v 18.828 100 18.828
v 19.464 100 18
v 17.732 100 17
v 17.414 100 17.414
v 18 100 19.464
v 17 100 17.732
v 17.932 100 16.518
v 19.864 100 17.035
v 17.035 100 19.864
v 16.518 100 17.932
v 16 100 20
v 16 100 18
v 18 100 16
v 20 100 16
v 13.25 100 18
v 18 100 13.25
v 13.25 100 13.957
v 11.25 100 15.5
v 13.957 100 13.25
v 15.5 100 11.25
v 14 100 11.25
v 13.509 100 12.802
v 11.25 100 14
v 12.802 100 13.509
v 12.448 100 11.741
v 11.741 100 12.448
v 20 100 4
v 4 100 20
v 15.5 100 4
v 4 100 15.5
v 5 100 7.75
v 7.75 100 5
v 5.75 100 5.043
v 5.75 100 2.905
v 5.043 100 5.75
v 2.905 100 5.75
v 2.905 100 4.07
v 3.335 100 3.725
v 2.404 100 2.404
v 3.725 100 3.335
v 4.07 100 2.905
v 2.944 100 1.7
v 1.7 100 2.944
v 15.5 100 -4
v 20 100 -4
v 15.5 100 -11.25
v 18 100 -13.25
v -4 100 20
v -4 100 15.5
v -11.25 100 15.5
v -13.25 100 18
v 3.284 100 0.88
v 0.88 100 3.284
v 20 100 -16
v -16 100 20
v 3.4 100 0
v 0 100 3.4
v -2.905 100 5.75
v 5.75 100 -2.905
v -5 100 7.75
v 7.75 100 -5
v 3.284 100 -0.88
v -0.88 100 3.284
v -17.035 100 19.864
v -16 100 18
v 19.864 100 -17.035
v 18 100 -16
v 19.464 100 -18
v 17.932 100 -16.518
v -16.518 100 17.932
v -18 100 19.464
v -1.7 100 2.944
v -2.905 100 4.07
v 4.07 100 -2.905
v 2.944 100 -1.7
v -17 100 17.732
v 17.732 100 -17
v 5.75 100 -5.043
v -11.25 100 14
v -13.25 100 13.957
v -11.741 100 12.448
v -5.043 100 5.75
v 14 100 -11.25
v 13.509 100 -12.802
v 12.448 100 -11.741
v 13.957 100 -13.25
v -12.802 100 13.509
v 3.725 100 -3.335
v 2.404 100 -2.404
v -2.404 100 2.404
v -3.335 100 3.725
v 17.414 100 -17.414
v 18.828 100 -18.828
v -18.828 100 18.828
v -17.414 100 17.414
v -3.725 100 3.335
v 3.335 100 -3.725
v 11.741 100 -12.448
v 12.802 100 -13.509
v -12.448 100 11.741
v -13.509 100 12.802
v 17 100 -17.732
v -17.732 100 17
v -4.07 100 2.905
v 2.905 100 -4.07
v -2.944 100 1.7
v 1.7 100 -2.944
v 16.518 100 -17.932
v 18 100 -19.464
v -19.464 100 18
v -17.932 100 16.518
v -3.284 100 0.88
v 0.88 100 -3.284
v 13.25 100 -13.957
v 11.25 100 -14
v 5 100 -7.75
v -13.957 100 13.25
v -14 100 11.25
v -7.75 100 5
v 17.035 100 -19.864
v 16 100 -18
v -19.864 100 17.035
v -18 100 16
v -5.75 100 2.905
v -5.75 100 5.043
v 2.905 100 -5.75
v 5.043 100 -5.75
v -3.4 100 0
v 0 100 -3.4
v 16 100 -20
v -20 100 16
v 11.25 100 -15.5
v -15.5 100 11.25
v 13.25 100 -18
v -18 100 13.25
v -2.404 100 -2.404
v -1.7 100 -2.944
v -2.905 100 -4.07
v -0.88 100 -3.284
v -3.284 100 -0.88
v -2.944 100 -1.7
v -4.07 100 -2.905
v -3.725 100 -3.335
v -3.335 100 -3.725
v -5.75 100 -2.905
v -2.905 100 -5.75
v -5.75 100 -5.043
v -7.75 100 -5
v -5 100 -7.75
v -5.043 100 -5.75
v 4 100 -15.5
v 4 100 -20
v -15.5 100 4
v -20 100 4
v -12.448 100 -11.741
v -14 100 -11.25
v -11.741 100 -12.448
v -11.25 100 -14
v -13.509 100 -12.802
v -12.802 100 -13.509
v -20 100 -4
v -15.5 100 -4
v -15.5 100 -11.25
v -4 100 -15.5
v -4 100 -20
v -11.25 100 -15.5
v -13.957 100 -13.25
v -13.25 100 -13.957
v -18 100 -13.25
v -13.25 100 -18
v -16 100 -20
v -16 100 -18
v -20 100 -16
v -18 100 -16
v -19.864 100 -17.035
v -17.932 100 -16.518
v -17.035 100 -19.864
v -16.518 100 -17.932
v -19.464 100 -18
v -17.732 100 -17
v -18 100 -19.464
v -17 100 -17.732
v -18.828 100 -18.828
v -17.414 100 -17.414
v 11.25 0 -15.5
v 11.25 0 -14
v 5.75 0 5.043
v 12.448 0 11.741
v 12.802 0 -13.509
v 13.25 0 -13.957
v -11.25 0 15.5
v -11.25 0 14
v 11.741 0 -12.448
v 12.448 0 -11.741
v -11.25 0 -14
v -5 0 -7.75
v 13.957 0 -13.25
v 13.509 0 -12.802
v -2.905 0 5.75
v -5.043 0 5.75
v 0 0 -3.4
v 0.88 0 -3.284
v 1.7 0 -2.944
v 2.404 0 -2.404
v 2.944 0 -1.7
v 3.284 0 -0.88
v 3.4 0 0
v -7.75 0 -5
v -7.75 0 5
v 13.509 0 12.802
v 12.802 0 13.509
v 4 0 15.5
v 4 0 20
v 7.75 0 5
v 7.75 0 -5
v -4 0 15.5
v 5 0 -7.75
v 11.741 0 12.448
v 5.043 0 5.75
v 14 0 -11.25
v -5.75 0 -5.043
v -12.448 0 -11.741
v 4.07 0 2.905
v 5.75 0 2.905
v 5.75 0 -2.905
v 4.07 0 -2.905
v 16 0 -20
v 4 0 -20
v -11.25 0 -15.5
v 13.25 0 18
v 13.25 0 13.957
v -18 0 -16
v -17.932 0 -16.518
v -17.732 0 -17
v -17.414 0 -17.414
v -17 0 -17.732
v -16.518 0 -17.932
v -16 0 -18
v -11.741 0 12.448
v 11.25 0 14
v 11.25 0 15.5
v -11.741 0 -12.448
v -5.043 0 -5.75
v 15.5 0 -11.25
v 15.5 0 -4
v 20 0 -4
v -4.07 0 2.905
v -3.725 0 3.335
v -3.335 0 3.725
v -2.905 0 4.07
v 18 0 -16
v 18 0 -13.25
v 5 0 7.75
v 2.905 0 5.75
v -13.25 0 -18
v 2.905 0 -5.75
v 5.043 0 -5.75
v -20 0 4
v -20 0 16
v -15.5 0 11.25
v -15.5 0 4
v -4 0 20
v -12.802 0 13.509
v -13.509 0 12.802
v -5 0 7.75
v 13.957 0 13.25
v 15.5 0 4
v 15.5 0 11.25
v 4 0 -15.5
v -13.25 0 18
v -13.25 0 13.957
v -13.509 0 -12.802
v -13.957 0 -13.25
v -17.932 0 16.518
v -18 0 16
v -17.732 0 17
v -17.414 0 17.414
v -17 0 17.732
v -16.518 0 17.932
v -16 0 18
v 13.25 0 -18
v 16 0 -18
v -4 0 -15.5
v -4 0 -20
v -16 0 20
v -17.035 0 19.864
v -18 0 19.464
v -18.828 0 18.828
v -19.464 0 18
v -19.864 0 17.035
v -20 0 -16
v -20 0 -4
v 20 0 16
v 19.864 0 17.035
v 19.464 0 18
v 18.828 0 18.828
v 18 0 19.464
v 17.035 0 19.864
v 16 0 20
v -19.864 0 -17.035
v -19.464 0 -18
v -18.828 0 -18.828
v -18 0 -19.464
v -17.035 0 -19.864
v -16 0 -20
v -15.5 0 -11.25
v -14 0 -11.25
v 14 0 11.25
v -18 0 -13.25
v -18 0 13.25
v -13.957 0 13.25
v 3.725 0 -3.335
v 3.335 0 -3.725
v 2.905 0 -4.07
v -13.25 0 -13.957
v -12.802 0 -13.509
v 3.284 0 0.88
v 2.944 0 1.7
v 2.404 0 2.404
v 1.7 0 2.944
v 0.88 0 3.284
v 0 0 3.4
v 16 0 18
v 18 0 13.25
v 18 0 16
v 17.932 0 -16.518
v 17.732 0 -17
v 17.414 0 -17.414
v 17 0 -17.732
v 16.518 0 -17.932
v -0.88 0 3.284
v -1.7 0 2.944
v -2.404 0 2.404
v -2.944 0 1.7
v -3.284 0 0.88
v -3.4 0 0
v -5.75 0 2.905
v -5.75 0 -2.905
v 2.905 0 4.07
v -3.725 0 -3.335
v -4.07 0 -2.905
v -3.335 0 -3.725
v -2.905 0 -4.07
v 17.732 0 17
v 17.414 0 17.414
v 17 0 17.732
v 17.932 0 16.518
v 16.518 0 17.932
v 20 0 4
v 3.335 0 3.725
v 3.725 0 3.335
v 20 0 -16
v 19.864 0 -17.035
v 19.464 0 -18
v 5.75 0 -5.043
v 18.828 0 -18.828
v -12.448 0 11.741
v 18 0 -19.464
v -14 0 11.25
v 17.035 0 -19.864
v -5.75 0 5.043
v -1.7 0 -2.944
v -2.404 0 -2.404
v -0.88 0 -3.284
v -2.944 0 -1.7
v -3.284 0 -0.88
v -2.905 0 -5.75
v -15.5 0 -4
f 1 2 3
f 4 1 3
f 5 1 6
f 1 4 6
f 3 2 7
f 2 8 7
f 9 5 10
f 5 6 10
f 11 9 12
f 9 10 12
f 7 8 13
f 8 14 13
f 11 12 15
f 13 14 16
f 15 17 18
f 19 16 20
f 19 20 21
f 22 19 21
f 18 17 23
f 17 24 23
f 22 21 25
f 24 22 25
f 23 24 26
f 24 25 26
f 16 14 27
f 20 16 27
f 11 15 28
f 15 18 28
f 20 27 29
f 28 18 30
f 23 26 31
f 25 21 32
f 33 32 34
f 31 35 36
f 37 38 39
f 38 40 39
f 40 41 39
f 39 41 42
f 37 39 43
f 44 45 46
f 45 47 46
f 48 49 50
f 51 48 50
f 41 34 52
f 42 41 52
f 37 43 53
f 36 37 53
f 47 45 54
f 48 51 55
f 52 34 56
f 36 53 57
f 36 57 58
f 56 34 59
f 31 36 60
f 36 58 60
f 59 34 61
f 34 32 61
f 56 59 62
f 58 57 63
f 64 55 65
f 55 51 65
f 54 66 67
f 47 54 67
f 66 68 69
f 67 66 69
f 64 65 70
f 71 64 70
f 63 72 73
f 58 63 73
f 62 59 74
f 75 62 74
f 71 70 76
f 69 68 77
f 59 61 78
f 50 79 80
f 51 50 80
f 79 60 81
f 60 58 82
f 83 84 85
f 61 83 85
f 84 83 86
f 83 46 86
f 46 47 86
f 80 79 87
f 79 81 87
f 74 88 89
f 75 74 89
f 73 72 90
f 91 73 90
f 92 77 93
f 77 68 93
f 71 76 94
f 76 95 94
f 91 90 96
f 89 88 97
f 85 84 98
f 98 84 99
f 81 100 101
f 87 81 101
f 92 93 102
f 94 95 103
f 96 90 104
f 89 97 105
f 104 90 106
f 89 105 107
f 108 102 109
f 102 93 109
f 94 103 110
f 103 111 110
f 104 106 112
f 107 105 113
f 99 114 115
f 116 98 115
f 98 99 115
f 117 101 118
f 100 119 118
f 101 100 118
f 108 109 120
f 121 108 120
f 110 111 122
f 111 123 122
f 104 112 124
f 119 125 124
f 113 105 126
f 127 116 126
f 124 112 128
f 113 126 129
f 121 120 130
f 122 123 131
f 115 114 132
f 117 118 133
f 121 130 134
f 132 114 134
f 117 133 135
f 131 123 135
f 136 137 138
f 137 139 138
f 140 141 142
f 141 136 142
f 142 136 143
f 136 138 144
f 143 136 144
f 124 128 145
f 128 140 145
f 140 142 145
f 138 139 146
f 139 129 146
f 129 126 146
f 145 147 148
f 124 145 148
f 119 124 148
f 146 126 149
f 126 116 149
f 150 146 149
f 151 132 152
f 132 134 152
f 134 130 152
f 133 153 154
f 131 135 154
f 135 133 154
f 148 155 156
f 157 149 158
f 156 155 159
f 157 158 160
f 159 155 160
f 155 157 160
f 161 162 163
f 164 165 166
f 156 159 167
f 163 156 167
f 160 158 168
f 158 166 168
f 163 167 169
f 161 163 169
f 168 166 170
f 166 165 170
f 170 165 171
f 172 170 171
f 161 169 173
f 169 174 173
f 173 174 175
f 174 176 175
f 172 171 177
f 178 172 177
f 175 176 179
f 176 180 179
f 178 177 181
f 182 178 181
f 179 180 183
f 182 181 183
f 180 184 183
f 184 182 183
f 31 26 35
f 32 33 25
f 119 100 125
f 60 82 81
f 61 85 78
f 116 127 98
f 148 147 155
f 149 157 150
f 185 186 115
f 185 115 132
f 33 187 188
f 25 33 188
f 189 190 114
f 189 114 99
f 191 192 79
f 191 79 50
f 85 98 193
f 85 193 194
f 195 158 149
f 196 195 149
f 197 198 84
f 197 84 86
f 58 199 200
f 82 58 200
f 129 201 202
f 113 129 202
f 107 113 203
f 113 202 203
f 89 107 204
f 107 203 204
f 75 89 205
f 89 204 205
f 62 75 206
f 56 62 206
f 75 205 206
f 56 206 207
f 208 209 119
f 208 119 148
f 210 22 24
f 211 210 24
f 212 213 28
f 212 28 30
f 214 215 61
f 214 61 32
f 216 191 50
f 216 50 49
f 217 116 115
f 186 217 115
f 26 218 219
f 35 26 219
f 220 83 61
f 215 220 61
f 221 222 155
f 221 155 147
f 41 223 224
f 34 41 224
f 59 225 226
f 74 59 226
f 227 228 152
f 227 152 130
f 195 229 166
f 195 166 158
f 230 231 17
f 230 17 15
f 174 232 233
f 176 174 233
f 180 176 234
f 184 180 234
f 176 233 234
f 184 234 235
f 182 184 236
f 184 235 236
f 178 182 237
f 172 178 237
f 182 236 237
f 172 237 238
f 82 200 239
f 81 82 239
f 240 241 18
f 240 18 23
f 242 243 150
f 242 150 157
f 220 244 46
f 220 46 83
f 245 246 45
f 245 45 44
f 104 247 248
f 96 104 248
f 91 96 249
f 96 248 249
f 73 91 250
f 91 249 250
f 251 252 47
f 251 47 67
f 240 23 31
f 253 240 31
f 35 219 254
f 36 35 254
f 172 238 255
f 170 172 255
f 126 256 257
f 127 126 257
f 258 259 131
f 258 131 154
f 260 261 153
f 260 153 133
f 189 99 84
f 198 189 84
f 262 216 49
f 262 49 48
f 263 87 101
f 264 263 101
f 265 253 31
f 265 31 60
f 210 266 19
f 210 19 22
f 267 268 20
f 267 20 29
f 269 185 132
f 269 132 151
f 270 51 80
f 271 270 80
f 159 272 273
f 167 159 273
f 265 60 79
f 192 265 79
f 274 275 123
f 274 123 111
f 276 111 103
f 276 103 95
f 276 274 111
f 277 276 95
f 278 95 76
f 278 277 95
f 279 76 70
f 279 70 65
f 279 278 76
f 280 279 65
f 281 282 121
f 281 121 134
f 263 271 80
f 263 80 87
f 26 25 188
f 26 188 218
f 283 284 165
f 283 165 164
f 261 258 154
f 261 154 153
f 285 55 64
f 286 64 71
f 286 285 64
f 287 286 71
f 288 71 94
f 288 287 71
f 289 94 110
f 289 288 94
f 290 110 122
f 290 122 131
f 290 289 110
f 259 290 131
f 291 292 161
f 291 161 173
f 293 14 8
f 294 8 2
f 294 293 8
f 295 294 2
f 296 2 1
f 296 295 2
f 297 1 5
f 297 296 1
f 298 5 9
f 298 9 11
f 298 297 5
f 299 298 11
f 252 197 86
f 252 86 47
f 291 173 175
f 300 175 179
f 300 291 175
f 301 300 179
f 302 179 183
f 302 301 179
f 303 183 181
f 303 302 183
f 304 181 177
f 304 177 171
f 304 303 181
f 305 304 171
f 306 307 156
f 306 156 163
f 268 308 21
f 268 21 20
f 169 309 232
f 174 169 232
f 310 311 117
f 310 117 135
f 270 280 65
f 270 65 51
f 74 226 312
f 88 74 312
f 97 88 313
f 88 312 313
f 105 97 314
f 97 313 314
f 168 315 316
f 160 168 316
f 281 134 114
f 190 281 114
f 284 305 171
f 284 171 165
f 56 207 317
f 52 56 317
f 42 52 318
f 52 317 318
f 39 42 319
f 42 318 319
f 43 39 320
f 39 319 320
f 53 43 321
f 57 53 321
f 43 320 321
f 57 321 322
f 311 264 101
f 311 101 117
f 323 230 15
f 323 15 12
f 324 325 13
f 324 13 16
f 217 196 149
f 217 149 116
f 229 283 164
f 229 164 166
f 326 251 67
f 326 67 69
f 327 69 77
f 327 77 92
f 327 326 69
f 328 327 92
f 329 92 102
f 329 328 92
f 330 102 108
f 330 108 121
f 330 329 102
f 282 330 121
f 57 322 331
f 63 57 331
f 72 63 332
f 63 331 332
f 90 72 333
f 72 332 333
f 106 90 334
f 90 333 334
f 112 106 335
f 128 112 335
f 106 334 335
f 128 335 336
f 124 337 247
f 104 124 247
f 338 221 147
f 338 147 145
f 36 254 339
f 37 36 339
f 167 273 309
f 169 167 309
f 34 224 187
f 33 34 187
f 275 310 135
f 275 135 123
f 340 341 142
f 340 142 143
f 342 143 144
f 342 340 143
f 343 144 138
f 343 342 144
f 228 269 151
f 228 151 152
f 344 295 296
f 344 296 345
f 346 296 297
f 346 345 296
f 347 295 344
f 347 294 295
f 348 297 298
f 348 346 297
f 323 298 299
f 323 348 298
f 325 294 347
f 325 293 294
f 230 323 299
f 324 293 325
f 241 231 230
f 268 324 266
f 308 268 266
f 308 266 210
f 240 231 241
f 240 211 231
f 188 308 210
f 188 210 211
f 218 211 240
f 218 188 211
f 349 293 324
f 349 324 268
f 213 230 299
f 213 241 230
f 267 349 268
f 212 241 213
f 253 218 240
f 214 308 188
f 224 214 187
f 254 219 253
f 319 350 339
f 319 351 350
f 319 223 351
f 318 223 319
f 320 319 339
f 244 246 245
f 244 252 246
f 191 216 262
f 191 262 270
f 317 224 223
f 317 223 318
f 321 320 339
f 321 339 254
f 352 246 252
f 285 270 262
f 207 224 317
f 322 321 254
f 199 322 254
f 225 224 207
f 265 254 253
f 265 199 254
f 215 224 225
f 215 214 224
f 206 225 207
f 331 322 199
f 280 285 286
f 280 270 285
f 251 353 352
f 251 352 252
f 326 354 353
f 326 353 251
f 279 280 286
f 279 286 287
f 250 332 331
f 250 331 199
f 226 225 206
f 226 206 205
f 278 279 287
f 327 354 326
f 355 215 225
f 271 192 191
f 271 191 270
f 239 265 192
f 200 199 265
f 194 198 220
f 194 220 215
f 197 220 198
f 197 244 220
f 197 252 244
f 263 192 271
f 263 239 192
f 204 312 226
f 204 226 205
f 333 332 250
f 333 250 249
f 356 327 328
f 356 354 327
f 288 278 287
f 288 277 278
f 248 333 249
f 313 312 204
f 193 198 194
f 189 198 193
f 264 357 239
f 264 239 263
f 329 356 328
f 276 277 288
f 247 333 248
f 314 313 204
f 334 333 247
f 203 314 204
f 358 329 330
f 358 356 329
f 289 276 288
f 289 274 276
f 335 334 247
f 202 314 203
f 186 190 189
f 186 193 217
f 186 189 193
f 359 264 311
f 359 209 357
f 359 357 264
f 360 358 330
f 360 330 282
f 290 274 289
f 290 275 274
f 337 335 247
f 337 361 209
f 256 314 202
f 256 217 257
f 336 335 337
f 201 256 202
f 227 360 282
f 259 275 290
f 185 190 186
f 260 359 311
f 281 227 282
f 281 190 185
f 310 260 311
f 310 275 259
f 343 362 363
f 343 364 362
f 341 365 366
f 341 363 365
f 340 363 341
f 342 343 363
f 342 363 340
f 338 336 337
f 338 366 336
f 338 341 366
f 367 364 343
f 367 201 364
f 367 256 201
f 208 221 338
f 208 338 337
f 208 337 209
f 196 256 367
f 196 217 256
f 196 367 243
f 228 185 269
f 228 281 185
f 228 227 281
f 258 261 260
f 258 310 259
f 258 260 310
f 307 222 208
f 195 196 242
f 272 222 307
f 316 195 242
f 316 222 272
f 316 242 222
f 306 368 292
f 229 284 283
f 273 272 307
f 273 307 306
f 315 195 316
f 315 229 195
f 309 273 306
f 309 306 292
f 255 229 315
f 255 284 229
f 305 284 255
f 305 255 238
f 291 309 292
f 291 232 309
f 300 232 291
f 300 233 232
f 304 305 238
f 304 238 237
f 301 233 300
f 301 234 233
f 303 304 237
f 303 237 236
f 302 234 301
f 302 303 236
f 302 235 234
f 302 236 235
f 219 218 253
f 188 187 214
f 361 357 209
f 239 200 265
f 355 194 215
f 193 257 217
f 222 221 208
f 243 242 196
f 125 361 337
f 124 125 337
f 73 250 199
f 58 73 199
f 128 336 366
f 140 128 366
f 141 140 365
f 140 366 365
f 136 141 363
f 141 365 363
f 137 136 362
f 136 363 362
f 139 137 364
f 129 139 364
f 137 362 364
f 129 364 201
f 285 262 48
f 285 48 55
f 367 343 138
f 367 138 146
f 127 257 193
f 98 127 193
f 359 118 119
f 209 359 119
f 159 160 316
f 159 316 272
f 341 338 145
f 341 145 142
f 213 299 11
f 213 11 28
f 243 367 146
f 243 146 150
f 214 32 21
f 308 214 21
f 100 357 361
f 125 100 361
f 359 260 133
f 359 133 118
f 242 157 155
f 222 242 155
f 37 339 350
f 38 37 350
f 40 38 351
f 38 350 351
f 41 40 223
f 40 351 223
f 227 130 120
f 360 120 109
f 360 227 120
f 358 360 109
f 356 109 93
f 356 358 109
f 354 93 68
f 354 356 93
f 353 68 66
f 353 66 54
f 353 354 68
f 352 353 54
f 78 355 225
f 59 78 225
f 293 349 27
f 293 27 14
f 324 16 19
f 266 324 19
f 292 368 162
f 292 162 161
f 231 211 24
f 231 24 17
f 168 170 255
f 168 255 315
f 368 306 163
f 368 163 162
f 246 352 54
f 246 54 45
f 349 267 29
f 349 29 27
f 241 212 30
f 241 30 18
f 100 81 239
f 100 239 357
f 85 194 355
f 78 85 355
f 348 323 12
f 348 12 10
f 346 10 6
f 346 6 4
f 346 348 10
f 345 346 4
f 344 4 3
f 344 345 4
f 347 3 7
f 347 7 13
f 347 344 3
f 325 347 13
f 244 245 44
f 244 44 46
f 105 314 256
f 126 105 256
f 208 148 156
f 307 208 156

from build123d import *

# Parameters (mm, degrees)
BOSS_EXTRUDE1_DEPTH = 100


with BuildPart() as part:
    # Sketch1 → Boss-Extrude1 (new body)
    with BuildSketch(Plane(origin=(0, 0, 0), x_dir=(1, 0, 0), z_dir=(0, 1, 0))):
        with BuildLine():
            Line((-20, 4), (-20, 16))
            ThreePointArc((-20, 16), (-18.828427125, 18.828427125), (-16, 20))
            Line((-16, 20), (-4, 20))
            Line((-4, 20), (-4, 15.5))
            Line((-4, 15.5), (-11.25, 15.5))
            Line((-11.25, 15.5), (-11.25, 14))
            Line((-11.25, 14), (-5, 7.75))
            Line((-5, 7.75), (0, 7.75))
            Line((0, 7.75), (5, 7.75))
            Line((5, 7.75), (11.25, 14))
            Line((11.25, 14), (11.25, 15.5))
            Line((11.25, 15.5), (4, 15.5))
            Line((4, 15.5), (4, 20))
            Line((4, 20), (16, 20))
            ThreePointArc((16, 20), (18.828427125, 18.828427125), (20, 16))
            Line((20, 16), (20, 4))
            Line((20, 4), (15.5, 4))
            Line((15.5, 4), (15.5, 11.25))
            Line((15.5, 11.25), (14, 11.25))
            Line((14, 11.25), (7.75, 5))
            Line((7.75, 5), (7.75, 0))
            Line((7.75, 0), (7.75, -5))
            Line((7.75, -5), (14, -11.25))
            Line((14, -11.25), (15.5, -11.25))
            Line((15.5, -11.25), (15.5, -4))
            Line((15.5, -4), (20, -4))
            Line((20, -4), (20, -16))
            ThreePointArc((20, -16), (18.828427125, -18.828427125), (16, -20))
            Line((16, -20), (4, -20))
            Line((4, -20), (4, -15.5))
            Line((4, -15.5), (11.25, -15.5))
            Line((11.25, -15.5), (11.25, -14))
            Line((11.25, -14), (5, -7.75))
            Line((5, -7.75), (0, -7.75))
            Line((0, -7.75), (-5, -7.75))
            Line((-5, -7.75), (-11.25, -14))
            Line((-11.25, -14), (-11.25, -15.5))
            Line((-11.25, -15.5), (-4, -15.5))
            Line((-4, -15.5), (-4, -20))
            Line((-4, -20), (-16, -20))
            ThreePointArc((-16, -20), (-18.828427125, -18.828427125), (-20, -16))
            Line((-20, -16), (-20, -4))
            Line((-20, -4), (-15.5, -4))
            Line((-15.5, -4), (-15.5, -11.25))
            Line((-15.5, -11.25), (-14, -11.25))
            Line((-14, -11.25), (-7.75, -5))
            Line((-7.75, -5), (-7.75, 0))
            Line((-7.75, 0), (-7.75, 5))
            Line((-7.75, 5), (-14, 11.25))
            Line((-14, 11.25), (-15.5, 11.25))
            Line((-15.5, 11.25), (-15.5, 4))
            Line((-15.5, 4), (-20, 4))
        make_face()
        with BuildLine():
            Line((-18, 13.25), (-18, 16))
            ThreePointArc((-18, 16), (-17.414213562, 17.414213562), (-16, 18))
            Line((-16, 18), (-13.25, 18))
            Line((-13.25, 18), (-13.25, 13.957106781))
            Line((-13.25, 13.957106781), (-12.801776695, 13.508883476))
            Line((-12.801776695, 13.508883476), (-13.508883476, 12.801776695))
            Line((-13.508883476, 12.801776695), (-13.957106781, 13.25))
            Line((-13.957106781, 13.25), (-18, 13.25))
        make_face(mode=Mode.SUBTRACT)
        with BuildLine():
            Line((-12.448223305, 11.741116524), (-5.75, 5.042893219))
            Line((-5.75, 5.042893219), (-5.75, 2.90473751))
            Line((-5.75, 2.90473751), (-5.25, 2.90473751))
            Line((-5.25, 2.90473751), (-4.069705149, 2.90473751))
            ThreePointArc((-4.069705149, 2.90473751), (-3.535533906, 3.535533906), (-2.90473751, 4.069705149))
            Line((-2.90473751, 4.069705149), (-2.90473751, 5.25))
            Line((-2.90473751, 5.25), (-2.90473751, 5.75))
            Line((-2.90473751, 5.75), (-5.042893219, 5.75))
            Line((-5.042893219, 5.75), (-11.741116524, 12.448223305))
            Line((-11.741116524, 12.448223305), (-12.448223305, 11.741116524))
        make_face(mode=Mode.SUBTRACT)
        with BuildLine():
            Line((18, 13.25), (18, 16))
            ThreePointArc((18, 16), (17.414213562, 17.414213562), (16, 18))
            Line((16, 18), (13.25, 18))
            Line((13.25, 18), (13.25, 13.957106781))
            Line((13.25, 13.957106781), (12.801776695, 13.508883476))
            Line((12.801776695, 13.508883476), (13.508883476, 12.801776695))
            Line((13.508883476, 12.801776695), (13.957106781, 13.25))
            Line((13.957106781, 13.25), (18, 13.25))
        make_face(mode=Mode.SUBTRACT)
        with BuildLine():
            Line((5.75, 5.042893219), (5.75, 2.90473751))
            Line((5.75, 2.90473751), (5.25, 2.90473751))
            Line((5.25, 2.90473751), (4.069705149, 2.90473751))
            ThreePointArc((4.069705149, 2.90473751), (3.535533906, 3.535533906), (2.90473751, 4.069705149))
            Line((2.90473751, 4.069705149), (2.90473751, 5.25))
            Line((2.90473751, 5.25), (2.90473751, 5.75))
            Line((2.90473751, 5.75), (5.042893219, 5.75))
            Line((5.042893219, 5.75), (11.741116524, 12.448223305))
            Line((11.741116524, 12.448223305), (12.448223305, 11.741116524))
            Line((12.448223305, 11.741116524), (5.75, 5.042893219))
        make_face(mode=Mode.SUBTRACT)
        with BuildLine():
            Line((13.25, -18), (16, -18))
            ThreePointArc((16, -18), (17.414213562, -17.414213562), (18, -16))
            Line((18, -16), (18, -13.25))
            Line((18, -13.25), (13.957106781, -13.25))
            Line((13.957106781, -13.25), (13.508883476, -12.801776695))
            Line((13.508883476, -12.801776695), (12.801776695, -13.508883476))
            Line((12.801776695, -13.508883476), (13.25, -13.957106781))
            Line((13.25, -13.957106781), (13.25, -18))
        make_face(mode=Mode.SUBTRACT)
        with BuildLine():
            Line((5.042893219, -5.75), (2.90473751, -5.75))
            Line((2.90473751, -5.75), (2.90473751, -5.25))
            Line((2.90473751, -5.25), (2.90473751, -4.069705149))
            ThreePointArc((2.90473751, -4.069705149), (3.535533906, -3.535533906), (4.069705149, -2.90473751))
            Line((4.069705149, -2.90473751), (5.25, -2.90473751))
            Line((5.25, -2.90473751), (5.75, -2.90473751))
            Line((5.75, -2.90473751), (5.75, -5.042893219))
            Line((5.75, -5.042893219), (12.448223305, -11.741116524))
            Line((12.448223305, -11.741116524), (11.741116524, -12.448223305))
            Line((11.741116524, -12.448223305), (5.042893219, -5.75))
        make_face(mode=Mode.SUBTRACT)
        with BuildLine():
            Line((-18, -13.25), (-18, -16))
            ThreePointArc((-18, -16), (-17.414213562, -17.414213562), (-16, -18))
            Line((-16, -18), (-13.25, -18))
            Line((-13.25, -18), (-13.25, -13.957106781))
            Line((-13.25, -13.957106781), (-12.801776695, -13.508883476))
            Line((-12.801776695, -13.508883476), (-13.508883476, -12.801776695))
            Line((-13.508883476, -12.801776695), (-13.957106781, -13.25))
            Line((-13.957106781, -13.25), (-18, -13.25))
        make_face(mode=Mode.SUBTRACT)
        with BuildLine():
            Line((-5.75, -5.042893219), (-5.75, -2.90473751))
            Line((-5.75, -2.90473751), (-5.25, -2.90473751))
            Line((-5.25, -2.90473751), (-4.069705149, -2.90473751))
            ThreePointArc((-4.069705149, -2.90473751), (-3.535533906, -3.535533906), (-2.90473751, -4.069705149))
            Line((-2.90473751, -4.069705149), (-2.90473751, -5.25))
            Line((-2.90473751, -5.25), (-2.90473751, -5.75))
            Line((-2.90473751, -5.75), (-5.042893219, -5.75))
            Line((-5.042893219, -5.75), (-11.741116524, -12.448223305))
            Line((-11.741116524, -12.448223305), (-12.448223305, -11.741116524))
            Line((-12.448223305, -11.741116524), (-5.75, -5.042893219))
        make_face(mode=Mode.SUBTRACT)
        with BuildLine():
            ThreePointArc((-3.4, 0), (-2.404163056, 2.404163056), (0, 3.4))
            ThreePointArc((0, 3.4), (2.404163056, 2.404163056), (3.4, 0))
            ThreePointArc((3.4, 0), (2.404163056, -2.404163056), (0, -3.4))
            ThreePointArc((0, -3.4), (-2.404163056, -2.404163056), (-3.4, 0))
        make_face(mode=Mode.SUBTRACT)
    extrude(amount=BOSS_EXTRUDE1_DEPTH)


solid = part.part
